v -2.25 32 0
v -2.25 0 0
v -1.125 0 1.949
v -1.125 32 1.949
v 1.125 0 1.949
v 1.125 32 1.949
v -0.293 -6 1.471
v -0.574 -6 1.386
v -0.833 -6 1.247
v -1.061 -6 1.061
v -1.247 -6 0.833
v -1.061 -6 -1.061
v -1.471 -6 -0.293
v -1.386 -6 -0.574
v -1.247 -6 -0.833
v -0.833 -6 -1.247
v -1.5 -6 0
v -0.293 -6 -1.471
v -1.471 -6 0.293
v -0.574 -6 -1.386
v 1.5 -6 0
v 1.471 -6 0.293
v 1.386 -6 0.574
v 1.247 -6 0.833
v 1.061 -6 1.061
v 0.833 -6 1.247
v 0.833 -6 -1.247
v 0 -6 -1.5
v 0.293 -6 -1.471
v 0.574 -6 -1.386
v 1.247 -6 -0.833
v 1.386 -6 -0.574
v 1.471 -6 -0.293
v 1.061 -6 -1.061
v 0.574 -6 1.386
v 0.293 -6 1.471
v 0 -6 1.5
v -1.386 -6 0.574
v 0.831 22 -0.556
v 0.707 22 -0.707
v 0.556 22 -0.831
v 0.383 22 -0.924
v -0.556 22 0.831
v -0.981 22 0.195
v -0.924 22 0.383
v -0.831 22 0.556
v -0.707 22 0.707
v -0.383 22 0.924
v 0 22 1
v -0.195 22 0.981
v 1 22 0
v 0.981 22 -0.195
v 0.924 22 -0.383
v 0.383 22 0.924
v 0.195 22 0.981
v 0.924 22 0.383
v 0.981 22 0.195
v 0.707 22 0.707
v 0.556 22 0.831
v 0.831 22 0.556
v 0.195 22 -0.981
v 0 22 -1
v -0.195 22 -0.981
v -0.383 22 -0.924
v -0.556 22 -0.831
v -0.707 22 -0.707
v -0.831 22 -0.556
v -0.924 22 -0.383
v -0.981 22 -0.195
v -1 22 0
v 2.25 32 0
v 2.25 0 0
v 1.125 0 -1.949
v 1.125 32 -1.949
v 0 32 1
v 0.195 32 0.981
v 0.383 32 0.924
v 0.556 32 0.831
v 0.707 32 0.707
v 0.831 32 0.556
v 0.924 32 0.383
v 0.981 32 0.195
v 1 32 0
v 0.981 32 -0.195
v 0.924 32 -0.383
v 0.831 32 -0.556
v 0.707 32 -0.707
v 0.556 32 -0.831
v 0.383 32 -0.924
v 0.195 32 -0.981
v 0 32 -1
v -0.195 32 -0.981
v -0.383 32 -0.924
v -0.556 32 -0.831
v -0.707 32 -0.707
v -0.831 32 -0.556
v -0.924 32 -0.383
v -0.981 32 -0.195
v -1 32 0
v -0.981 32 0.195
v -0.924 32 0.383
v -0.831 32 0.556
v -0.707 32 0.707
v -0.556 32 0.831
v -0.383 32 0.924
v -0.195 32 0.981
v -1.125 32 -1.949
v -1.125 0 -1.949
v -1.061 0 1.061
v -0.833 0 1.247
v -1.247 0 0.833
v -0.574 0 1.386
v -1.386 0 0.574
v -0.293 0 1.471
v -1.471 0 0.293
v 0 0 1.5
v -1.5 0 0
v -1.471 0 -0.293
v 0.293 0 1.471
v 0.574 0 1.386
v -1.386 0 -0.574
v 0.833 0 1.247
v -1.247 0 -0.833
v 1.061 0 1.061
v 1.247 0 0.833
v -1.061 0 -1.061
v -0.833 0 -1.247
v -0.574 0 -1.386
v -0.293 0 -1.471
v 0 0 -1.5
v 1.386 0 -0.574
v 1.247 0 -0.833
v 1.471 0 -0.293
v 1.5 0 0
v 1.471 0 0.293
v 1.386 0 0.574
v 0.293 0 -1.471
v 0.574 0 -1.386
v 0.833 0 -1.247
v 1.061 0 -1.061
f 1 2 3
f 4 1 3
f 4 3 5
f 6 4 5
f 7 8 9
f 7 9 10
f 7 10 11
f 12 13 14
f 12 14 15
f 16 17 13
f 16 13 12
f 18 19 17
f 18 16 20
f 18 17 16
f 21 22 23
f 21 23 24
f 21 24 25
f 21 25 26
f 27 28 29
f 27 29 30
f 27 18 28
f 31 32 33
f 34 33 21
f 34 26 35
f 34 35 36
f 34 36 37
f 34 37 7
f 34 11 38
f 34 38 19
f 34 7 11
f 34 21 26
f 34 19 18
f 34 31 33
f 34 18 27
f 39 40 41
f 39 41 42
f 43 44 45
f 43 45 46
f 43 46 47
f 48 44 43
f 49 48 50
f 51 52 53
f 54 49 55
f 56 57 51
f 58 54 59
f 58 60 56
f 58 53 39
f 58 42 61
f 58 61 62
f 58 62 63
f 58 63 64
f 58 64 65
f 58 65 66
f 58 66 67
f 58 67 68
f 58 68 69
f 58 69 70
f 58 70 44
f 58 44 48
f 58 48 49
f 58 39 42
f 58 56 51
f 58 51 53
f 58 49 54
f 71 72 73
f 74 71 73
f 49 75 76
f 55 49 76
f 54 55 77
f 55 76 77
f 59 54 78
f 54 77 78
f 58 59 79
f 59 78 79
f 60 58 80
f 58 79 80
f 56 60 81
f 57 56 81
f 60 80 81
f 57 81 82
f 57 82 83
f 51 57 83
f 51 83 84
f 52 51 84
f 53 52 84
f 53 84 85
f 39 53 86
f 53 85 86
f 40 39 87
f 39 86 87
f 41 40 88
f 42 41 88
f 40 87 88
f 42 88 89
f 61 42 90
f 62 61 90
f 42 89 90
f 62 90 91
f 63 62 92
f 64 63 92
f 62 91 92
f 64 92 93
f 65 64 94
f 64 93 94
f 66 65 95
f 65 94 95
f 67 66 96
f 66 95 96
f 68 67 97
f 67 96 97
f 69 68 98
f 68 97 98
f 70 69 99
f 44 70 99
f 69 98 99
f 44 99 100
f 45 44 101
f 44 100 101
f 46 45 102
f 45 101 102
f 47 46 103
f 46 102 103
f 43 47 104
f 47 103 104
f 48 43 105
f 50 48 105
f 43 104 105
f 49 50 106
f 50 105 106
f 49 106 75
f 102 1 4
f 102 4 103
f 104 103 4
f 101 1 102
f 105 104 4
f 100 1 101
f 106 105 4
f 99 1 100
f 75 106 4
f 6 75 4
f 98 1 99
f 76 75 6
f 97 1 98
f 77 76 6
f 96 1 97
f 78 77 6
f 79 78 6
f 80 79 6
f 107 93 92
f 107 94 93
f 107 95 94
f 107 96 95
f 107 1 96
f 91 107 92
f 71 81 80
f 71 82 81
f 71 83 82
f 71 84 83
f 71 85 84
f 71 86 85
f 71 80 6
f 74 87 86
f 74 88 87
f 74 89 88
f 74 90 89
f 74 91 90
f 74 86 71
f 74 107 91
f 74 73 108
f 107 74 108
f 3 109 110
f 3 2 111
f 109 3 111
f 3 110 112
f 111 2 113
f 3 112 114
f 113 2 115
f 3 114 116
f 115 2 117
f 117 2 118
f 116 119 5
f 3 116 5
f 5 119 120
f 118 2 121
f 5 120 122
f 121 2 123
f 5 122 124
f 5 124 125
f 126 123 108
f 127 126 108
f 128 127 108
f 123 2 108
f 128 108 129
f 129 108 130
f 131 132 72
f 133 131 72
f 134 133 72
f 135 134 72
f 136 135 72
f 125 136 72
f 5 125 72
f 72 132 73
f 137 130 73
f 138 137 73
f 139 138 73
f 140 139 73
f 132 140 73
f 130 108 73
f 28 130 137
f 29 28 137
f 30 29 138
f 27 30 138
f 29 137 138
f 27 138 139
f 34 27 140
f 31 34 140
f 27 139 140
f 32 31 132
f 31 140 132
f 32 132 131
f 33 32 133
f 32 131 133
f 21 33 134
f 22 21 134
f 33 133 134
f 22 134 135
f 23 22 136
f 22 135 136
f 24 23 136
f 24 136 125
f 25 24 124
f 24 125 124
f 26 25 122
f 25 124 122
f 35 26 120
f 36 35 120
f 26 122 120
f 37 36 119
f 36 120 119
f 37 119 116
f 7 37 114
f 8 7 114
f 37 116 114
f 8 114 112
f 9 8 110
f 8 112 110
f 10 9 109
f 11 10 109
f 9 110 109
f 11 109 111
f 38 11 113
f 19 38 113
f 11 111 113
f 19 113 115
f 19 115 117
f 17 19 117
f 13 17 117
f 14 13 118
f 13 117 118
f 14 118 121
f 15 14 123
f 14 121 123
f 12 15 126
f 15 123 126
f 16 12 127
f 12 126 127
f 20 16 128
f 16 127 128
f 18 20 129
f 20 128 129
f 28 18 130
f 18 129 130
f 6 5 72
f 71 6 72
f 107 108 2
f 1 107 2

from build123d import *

# Parameters (mm, degrees)
EXTRUDE_1_DEPTH     = 32
SKETCH_2_R          = 1.5
EXTRUDE_2_DEPTH     = 6
SKETCH_3_R          = 1
CUT_EXTRUDE_1_DEPTH = 10


with BuildPart() as part:
    # 草图1 → 凸台-拉伸1 (new body)
    with BuildSketch(Plane(origin=(0, 0, 0), x_dir=(1, 0, 0), z_dir=(0, 1, 0))):
        Polygon((2.25, 0), (1.125, 1.948557159), (-1.125, 1.948557159), (-2.25, 0), (-1.125, -1.948557159), (1.125, -1.948557159), align=None)
    extrude(amount=EXTRUDE_1_DEPTH)

    # 草图2 → 凸台-拉伸2 (add)
    with BuildSketch(Plane.XZ):
        with Locations(Location((0, 0, 0), (0, 0, 270))):
            Circle(SKETCH_2_R)
    extrude(amount=EXTRUDE_2_DEPTH)

    # 草图3 → 切除-拉伸1 (cut)
    with BuildSketch(Plane(origin=(0, 32, 0), x_dir=(1, 0, 0), z_dir=(0, 1, 0))):
        with Locations(Location((0, 0, 0), (0, 0, 270))):
            Circle(SKETCH_3_R)
    extrude(amount=-CUT_EXTRUDE_1_DEPTH, mode=Mode.SUBTRACT)


solid = part.part
